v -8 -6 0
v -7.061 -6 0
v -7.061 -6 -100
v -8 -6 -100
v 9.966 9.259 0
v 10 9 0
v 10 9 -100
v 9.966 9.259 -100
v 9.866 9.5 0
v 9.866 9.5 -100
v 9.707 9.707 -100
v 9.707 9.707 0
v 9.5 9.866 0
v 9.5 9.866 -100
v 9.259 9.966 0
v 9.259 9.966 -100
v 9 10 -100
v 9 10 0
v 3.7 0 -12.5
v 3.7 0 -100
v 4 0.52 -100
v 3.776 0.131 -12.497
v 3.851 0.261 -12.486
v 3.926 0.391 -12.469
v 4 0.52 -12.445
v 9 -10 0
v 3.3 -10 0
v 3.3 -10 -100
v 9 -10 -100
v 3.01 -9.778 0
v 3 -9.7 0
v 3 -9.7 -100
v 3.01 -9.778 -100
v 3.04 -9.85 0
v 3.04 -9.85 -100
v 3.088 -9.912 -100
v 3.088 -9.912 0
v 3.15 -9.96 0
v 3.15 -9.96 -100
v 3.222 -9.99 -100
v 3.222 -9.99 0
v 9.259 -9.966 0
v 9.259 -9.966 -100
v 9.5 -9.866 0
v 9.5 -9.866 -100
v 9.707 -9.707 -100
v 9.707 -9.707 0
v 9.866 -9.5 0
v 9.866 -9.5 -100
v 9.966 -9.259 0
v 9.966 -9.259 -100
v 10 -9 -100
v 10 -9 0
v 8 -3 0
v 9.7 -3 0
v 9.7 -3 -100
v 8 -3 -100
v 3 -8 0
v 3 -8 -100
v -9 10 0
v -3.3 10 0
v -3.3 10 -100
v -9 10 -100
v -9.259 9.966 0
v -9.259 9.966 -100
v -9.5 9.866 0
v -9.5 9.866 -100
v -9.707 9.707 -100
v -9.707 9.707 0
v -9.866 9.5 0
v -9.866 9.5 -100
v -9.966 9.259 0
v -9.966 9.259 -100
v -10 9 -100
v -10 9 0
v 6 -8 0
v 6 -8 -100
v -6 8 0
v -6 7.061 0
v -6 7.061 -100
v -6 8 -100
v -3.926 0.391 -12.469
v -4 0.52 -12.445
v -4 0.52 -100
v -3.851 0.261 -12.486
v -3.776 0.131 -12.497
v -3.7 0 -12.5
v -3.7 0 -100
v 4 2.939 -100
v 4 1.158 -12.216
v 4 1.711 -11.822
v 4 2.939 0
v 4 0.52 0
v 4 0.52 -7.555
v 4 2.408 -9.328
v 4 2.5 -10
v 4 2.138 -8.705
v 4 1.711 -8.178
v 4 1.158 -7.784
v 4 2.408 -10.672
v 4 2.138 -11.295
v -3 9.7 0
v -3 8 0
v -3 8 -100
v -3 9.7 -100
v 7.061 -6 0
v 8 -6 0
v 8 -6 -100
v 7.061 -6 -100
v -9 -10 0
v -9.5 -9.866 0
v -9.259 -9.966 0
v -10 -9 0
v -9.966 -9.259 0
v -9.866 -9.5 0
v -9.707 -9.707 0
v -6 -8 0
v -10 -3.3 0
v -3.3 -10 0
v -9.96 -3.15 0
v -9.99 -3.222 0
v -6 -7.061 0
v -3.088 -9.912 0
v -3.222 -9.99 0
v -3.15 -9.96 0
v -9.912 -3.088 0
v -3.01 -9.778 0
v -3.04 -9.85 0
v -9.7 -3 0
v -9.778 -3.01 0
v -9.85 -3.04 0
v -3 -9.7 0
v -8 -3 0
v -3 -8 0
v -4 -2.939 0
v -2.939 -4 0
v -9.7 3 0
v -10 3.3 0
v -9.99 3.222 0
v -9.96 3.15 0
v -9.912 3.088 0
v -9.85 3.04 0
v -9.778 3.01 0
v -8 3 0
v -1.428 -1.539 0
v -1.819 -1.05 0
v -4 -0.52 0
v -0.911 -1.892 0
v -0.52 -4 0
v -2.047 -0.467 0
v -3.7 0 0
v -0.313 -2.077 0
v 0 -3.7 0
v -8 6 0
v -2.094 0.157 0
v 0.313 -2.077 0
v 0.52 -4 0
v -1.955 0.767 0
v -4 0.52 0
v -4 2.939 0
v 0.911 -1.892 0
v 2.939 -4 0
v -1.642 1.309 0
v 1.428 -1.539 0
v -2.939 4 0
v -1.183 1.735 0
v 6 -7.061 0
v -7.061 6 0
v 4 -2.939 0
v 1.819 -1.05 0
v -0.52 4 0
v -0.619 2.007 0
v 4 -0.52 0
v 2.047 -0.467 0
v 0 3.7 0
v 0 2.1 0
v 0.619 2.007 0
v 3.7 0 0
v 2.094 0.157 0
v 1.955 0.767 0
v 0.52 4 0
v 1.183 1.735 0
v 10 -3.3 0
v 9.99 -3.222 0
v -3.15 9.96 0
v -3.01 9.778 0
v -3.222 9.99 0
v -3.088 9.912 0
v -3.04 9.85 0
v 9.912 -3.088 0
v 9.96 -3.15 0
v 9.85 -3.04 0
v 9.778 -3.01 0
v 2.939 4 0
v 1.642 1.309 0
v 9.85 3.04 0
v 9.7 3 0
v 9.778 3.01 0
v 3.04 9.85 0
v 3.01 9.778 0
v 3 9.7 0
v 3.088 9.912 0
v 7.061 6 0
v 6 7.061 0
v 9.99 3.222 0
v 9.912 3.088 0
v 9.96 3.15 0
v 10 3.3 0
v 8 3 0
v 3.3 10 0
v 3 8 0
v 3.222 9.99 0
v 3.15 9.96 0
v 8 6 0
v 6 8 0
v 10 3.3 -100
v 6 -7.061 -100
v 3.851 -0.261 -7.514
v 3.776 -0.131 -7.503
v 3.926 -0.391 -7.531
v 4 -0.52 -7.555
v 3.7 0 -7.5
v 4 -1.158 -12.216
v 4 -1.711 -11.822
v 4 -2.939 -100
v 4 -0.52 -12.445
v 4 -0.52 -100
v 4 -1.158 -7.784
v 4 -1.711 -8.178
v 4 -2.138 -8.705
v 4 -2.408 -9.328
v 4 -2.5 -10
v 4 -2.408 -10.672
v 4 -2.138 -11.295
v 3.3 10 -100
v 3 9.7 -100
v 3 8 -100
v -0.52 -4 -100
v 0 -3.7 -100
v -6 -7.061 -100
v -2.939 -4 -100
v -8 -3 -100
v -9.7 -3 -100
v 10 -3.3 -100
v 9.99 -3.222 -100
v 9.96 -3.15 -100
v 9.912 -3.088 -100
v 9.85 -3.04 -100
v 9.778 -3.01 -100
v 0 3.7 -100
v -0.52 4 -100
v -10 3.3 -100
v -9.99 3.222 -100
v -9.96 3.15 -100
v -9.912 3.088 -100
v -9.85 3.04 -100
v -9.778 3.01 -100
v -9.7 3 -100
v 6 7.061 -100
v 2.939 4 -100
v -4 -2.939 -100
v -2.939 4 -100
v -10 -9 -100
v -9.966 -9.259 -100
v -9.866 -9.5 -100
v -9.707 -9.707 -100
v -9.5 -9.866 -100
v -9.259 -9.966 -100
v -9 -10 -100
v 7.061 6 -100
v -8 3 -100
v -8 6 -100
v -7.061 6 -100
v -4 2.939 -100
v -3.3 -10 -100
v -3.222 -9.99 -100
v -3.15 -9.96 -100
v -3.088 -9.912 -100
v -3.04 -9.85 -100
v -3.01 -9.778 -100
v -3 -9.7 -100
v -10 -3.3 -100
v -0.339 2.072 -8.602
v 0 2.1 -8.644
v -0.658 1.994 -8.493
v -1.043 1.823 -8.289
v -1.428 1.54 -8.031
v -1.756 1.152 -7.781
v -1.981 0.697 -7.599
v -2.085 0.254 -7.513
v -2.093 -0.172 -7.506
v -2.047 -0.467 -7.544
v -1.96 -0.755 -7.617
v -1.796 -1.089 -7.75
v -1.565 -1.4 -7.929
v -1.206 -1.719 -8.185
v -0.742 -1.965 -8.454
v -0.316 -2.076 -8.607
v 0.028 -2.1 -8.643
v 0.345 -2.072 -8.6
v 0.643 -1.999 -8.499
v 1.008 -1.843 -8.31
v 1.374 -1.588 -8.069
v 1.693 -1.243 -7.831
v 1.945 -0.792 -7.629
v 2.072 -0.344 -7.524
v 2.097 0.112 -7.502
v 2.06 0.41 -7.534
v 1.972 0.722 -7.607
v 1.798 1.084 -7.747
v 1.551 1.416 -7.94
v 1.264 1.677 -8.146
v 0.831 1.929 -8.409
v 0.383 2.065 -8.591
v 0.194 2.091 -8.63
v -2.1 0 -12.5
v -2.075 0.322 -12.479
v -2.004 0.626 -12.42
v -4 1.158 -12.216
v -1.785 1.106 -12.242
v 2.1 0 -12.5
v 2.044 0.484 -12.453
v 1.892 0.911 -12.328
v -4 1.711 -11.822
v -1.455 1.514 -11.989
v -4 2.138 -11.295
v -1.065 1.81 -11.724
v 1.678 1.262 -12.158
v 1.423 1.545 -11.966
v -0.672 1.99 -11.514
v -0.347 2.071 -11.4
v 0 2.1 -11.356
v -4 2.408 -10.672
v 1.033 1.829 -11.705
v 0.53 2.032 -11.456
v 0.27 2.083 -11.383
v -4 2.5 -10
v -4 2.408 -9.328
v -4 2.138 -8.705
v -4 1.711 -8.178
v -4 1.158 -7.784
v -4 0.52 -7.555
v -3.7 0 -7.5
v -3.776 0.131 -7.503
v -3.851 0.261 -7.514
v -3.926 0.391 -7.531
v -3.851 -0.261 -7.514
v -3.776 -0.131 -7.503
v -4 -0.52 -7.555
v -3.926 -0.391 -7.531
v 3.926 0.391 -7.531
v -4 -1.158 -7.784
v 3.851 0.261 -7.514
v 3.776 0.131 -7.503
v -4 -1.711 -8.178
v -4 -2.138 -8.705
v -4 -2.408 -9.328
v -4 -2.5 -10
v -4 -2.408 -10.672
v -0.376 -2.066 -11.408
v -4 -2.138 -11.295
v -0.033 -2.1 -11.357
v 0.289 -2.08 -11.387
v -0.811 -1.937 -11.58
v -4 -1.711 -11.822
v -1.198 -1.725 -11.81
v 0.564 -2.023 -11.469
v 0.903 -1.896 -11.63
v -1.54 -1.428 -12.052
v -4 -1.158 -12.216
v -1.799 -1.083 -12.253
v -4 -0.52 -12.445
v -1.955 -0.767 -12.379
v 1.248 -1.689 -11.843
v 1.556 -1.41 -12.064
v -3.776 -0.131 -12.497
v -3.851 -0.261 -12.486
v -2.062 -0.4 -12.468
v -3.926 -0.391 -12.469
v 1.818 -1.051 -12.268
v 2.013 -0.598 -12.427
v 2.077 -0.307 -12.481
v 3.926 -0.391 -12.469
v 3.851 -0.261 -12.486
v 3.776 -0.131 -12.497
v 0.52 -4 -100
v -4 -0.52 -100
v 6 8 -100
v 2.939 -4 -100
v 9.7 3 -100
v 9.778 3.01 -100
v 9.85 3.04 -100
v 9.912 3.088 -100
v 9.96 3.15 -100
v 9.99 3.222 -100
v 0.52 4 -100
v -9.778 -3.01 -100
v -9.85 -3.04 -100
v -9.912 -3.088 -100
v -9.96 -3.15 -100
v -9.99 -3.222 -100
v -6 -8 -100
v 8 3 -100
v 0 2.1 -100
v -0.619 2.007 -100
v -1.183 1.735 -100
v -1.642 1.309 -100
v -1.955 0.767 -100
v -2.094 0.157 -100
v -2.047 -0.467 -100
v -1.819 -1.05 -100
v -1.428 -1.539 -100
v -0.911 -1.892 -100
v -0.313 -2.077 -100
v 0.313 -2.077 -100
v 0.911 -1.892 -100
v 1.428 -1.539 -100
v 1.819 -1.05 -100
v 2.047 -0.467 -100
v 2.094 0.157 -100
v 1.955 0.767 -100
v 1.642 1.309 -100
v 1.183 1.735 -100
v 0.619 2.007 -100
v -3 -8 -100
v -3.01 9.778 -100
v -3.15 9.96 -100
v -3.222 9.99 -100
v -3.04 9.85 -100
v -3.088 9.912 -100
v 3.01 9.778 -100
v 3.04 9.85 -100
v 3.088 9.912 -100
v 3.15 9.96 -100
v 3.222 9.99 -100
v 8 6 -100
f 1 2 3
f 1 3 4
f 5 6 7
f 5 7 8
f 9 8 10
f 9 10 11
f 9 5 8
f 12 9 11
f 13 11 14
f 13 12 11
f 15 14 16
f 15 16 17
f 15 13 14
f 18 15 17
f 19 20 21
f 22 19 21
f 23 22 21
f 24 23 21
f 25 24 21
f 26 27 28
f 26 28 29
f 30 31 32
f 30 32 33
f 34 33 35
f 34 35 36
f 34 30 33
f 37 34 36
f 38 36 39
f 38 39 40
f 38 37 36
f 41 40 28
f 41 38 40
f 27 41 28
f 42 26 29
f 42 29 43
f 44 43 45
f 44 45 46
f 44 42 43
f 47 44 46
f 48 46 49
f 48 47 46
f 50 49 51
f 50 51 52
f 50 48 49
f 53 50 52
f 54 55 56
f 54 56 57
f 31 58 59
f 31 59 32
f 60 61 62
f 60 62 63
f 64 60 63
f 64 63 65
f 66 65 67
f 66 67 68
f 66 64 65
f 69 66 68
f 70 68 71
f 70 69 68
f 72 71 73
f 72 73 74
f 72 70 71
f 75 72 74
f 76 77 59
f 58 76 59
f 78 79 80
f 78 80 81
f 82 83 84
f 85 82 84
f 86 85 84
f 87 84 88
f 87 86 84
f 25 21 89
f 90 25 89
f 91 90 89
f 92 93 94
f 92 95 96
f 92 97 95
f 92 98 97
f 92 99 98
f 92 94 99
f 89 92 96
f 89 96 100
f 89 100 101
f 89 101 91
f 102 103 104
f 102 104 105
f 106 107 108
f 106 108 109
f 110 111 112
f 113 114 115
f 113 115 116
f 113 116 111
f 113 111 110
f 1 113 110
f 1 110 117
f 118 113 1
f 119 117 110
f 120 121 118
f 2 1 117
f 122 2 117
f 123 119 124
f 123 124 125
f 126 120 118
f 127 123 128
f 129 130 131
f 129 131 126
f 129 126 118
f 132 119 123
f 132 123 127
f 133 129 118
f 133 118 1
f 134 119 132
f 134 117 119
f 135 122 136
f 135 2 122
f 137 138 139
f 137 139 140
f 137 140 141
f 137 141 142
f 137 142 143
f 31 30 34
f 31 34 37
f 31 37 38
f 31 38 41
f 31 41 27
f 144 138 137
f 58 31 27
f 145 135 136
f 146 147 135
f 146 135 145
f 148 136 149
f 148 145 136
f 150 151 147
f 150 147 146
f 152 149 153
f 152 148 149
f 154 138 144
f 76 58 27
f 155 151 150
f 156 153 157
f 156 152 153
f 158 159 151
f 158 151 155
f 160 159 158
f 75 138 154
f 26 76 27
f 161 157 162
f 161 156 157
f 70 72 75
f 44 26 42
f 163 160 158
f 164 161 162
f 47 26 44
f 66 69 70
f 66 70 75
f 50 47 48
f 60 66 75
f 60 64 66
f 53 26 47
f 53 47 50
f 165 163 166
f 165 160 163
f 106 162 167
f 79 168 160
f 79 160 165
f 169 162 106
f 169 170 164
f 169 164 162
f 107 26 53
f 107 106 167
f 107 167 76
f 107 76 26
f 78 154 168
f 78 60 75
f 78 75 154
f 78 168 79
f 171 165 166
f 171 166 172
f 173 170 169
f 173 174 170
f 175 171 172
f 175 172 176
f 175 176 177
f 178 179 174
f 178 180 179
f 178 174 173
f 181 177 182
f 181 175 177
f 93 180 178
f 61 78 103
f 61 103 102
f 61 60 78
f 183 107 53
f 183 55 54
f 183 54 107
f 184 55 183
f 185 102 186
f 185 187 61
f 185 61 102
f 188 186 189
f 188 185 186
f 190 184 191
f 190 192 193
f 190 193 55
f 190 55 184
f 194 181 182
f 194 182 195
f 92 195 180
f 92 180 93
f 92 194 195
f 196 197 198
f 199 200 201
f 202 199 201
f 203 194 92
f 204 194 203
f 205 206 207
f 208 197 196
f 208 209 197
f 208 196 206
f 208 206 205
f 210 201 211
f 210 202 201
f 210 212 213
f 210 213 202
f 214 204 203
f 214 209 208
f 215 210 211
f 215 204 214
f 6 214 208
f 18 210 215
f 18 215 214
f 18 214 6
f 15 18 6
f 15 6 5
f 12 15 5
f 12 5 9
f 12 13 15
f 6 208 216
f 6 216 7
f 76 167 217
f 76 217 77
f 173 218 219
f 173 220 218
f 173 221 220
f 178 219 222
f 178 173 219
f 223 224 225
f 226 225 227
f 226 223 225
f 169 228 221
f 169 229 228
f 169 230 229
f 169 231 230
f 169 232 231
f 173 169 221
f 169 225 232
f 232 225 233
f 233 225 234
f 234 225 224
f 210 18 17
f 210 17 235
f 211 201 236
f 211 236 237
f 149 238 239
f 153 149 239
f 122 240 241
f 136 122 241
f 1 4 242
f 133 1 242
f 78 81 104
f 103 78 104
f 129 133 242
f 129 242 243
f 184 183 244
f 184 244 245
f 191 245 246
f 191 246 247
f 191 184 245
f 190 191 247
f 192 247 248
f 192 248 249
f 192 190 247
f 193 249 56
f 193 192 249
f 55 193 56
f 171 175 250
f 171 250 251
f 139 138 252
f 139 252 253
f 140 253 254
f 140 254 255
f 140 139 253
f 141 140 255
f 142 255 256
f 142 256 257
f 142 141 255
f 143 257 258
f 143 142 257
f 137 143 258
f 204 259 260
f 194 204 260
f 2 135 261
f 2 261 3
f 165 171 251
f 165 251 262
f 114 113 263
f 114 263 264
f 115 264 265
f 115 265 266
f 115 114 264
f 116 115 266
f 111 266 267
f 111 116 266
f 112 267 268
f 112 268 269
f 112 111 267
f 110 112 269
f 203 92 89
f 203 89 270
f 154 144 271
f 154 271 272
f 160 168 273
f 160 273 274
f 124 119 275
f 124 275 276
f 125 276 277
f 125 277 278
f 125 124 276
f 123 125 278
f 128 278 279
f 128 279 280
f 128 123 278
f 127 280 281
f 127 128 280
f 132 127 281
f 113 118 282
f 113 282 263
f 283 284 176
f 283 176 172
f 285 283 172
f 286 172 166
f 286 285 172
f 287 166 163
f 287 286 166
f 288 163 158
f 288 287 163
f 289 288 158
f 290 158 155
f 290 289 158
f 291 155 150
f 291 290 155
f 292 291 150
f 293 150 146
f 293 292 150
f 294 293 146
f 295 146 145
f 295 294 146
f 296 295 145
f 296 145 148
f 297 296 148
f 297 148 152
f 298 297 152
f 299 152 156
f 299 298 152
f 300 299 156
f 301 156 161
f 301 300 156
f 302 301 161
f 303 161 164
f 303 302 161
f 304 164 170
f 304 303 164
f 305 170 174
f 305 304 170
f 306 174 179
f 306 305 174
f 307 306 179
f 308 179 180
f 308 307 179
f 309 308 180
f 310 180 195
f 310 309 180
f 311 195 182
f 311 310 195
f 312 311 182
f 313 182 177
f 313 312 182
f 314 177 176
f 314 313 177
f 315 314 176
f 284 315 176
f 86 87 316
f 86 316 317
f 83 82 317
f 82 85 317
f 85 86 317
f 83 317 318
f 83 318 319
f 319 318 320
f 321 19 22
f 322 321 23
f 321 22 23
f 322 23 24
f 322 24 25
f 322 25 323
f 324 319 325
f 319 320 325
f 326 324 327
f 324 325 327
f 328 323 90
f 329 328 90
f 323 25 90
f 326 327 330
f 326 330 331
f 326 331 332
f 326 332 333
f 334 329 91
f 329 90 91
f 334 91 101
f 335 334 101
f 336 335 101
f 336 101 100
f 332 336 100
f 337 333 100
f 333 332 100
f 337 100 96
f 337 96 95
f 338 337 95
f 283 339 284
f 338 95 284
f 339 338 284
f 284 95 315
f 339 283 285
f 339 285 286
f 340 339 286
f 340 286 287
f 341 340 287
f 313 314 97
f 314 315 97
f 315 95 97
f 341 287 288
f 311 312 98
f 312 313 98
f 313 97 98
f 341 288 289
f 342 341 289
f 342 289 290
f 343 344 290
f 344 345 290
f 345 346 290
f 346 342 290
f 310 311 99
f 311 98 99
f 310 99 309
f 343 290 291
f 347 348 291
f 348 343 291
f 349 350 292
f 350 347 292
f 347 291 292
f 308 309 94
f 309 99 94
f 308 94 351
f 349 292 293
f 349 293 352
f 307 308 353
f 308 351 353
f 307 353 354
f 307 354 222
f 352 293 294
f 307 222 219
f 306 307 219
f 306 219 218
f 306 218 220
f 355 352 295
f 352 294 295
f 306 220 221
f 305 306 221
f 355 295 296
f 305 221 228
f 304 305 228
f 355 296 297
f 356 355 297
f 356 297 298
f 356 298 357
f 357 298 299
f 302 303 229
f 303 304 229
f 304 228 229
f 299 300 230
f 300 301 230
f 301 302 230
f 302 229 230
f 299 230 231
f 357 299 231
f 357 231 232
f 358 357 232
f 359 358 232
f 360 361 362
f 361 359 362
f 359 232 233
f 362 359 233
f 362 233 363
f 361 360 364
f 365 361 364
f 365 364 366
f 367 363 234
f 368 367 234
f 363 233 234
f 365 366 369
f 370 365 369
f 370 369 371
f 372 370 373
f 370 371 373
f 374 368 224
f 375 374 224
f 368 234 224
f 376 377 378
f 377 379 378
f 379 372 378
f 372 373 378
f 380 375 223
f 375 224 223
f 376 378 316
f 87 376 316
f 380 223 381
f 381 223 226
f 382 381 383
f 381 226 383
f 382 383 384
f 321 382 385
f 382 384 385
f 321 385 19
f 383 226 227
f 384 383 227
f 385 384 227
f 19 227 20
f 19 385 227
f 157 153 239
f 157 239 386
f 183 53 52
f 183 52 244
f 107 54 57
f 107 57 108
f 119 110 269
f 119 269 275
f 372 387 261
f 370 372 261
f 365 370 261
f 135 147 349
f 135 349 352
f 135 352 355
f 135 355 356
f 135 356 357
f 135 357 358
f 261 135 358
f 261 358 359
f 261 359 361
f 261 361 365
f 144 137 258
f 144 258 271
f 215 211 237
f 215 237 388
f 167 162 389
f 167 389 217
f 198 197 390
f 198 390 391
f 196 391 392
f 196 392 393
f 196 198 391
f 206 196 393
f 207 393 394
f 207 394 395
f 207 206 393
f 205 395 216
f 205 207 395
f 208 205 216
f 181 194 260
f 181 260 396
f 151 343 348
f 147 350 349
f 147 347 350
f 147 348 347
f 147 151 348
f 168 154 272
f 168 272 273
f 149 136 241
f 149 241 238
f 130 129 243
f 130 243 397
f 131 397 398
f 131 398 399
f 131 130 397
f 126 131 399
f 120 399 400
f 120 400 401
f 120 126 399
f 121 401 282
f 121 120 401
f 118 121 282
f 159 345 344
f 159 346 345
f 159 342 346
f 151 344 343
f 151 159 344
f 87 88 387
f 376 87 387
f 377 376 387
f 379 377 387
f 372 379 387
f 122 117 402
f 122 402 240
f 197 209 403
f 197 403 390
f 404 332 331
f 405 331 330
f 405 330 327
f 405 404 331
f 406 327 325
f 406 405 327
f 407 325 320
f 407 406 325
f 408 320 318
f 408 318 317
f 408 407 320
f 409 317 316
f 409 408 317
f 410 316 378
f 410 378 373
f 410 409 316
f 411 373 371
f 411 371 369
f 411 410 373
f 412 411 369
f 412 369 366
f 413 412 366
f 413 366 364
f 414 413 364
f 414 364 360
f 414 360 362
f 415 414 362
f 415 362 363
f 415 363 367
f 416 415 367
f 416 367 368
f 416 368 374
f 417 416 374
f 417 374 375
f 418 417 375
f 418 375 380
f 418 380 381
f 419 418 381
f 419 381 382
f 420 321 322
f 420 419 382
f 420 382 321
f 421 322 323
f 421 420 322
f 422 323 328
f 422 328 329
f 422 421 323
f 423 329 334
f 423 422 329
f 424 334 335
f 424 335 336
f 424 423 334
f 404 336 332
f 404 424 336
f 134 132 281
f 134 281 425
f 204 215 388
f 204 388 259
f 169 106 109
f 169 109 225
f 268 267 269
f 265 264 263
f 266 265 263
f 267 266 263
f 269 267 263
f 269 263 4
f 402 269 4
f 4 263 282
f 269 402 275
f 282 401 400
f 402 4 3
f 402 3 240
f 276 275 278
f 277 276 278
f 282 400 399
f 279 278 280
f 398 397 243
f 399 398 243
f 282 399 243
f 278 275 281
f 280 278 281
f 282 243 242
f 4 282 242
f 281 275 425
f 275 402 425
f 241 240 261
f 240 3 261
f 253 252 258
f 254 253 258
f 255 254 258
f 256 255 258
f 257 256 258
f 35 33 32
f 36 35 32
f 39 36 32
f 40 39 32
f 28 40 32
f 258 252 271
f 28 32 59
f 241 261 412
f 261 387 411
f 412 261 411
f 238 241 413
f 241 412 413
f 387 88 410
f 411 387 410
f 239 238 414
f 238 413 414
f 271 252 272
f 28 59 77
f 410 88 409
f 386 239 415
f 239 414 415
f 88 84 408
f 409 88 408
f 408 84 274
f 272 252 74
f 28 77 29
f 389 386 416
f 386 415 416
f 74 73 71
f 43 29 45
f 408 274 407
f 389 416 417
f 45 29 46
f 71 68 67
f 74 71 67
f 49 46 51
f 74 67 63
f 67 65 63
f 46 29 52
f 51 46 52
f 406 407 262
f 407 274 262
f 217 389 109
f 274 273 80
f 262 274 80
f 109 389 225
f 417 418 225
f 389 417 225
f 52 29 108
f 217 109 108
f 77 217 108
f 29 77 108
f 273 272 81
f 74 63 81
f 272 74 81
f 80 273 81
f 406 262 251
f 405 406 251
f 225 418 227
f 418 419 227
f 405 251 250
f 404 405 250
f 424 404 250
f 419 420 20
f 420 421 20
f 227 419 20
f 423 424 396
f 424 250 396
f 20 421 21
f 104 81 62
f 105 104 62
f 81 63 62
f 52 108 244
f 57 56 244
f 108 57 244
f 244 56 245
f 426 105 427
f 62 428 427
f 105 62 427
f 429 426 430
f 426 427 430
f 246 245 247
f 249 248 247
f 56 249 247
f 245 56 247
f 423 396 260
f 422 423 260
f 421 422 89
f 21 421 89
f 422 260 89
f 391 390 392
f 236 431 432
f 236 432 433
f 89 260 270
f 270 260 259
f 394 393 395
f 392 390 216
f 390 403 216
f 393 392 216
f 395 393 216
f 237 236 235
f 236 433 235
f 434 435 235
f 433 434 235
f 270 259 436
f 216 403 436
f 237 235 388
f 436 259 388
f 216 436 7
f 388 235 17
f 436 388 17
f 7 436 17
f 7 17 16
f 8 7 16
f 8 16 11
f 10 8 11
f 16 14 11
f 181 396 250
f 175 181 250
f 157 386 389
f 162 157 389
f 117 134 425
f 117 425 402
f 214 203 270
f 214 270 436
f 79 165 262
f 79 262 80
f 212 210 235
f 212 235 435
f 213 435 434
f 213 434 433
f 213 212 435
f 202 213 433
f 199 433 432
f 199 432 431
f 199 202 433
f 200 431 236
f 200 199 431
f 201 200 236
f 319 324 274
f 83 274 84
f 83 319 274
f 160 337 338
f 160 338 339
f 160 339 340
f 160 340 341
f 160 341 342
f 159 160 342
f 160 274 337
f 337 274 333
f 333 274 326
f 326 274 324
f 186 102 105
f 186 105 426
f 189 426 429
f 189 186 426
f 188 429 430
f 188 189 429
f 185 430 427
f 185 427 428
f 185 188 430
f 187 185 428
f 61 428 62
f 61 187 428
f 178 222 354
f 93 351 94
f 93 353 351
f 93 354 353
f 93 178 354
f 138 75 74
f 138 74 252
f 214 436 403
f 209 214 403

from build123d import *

# Parameters (mm, degrees)
BOSS_EXTRUDE1_DEPTH = 100
SKETCH2_W           = 100
SKETCH2_H           = 2.1
SKETCH4_R           = 2.5
CUT_EXTRUDE1_DEPTH  = 8


with BuildPart() as part:
    # Sketch1 → Boss-Extrude1 (new body)
    with BuildSketch(Plane.XY):
        with BuildLine():
            Line((-10, 9), (-10, 3.29999995))
            ThreePointArc((-10, 3.29999995), (-9.912132049, 3.087867916), (-9.7, 3))
            Line((-9.7, 3), (-8, 3))
            Line((-8, 3), (-8, 6))
            Line((-8, 6), (-7.060677, 6))
            Line((-7.060677, 6), (-4, 2.93932965))
            Line((-4, 2.93932965), (-4, 0.519615242))
            Line((-4, 0.519615242), (-3.699996283, -6.437e-06))
            Line((-3.699996283, -6.437e-06), (-4, -0.519628117))
            Line((-4, -0.519628117), (-4, -2.93933725))
            Line((-4, -2.93933725), (-7.0606695, -6))
            Line((-7.0606695, -6), (-8, -6))
            Line((-8, -6), (-8, -3))
            Line((-8, -3), (-9.7, -3))
            ThreePointArc((-9.7, -3), (-9.912132049, -3.087867916), (-10, -3.29999995))
            Line((-10, -3.29999995), (-10, -9))
            ThreePointArc((-10, -9), (-9.707106781, -9.707106781), (-9, -10))
            Line((-9, -10), (-3.29999995, -10))
            ThreePointArc((-3.29999995, -10), (-3.087867916, -9.912132049), (-3, -9.7))
            Line((-3, -9.7), (-3, -8))
            Line((-3, -8), (-6, -8))
            Line((-6, -8), (-6, -7.0606515))
            Line((-6, -7.0606515), (-2.9393489, -4))
            Line((-2.9393489, -4), (-0.519615242, -4))
            Line((-0.519615242, -4), (6.437e-06, -3.699996283))
            Line((6.437e-06, -3.699996283), (0.519628117, -4))
            Line((0.519628117, -4), (2.9393227, -4))
            Line((2.9393227, -4), (6, -7.060677))
            Line((6, -7.060677), (6, -8))
            Line((6, -8), (3, -8))
            Line((3, -8), (3, -9.7))
            ThreePointArc((3, -9.7), (3.087867916, -9.912132049), (3.29999995, -10))
            Line((3.29999995, -10), (9, -10))
            ThreePointArc((9, -10), (9.707106781, -9.707106781), (10, -9))
            Line((10, -9), (10, -3.29999995))
            ThreePointArc((10, -3.29999995), (9.912132049, -3.087867916), (9.7, -3))
            Line((9.7, -3), (8, -3))
            Line((8, -3), (8, -6))
            Line((8, -6), (7.0606435, -6))
            Line((7.0606435, -6), (4, -2.9393482))
            Line((4, -2.9393482), (4, -0.519615242))
            Line((4, -0.519615242), (3.699996283, 6.437e-06))
            Line((3.699996283, 6.437e-06), (4, 0.519628117))
            Line((4, 0.519628117), (4, 2.9393401))
            Line((4, 2.9393401), (7.060651, 6))
            Line((7.060651, 6), (8, 6))
            Line((8, 6), (8, 3))
            Line((8, 3), (9.7, 3))
            ThreePointArc((9.7, 3), (9.912132049, 3.087867916), (10, 3.29999995))
            Line((10, 3.29999995), (10, 9))
            ThreePointArc((10, 9), (9.707106781, 9.707106781), (9, 10))
            Line((9, 10), (3.29999995, 10))
            ThreePointArc((3.29999995, 10), (3.087867916, 9.912132049), (3, 9.7))
            Line((3, 9.7), (3, 8))
            Line((3, 8), (6, 8))
            Line((6, 8), (6, 7.060669))
            Line((6, 7.060669), (2.9393308, 4))
            Line((2.9393308, 4), (0.519615242, 4))
            Line((0.519615242, 4), (-6.437e-06, 3.699996283))
            Line((-6.437e-06, 3.699996283), (-0.519628117, 4))
            Line((-0.519628117, 4), (-2.93935655, 4))
            Line((-2.93935655, 4), (-6, 7.0606435))
            Line((-6, 7.0606435), (-6, 8))
            Line((-6, 8), (-3, 8))
            Line((-3, 8), (-3, 9.7))
            ThreePointArc((-3, 9.7), (-3.087867966, 9.912132034), (-3.3, 10))
            Line((-3.3, 10), (-9, 10))
            ThreePointArc((-9, 10), (-9.707106781, 9.707106781), (-10, 9))
        make_face()
    extrude(amount=-BOSS_EXTRUDE1_DEPTH)

    # Sketch2 → Cut-Revolve1 (revolve, cut)
    with BuildSketch(Plane(origin=(0, 0, 0), x_dir=(0, 0, -1), z_dir=(1, 0, 0))):
        with Locations((50, 1.05)):
            Rectangle(SKETCH2_W, SKETCH2_H)
    revolve(axis=Axis((0, 0, -100), (0, 0, 1)), mode=Mode.SUBTRACT)

    # Sketch4 → Cut-Extrude1 (cut)
    with BuildSketch(Plane(origin=(4, 0, 0), x_dir=(0, 0, -1), z_dir=(1, 0, 0))):
        with Locations((10, 6.437e-06)):
            Circle(SKETCH4_R)
    extrude(amount=-CUT_EXTRUDE1_DEPTH, mode=Mode.SUBTRACT)


solid = part.part
